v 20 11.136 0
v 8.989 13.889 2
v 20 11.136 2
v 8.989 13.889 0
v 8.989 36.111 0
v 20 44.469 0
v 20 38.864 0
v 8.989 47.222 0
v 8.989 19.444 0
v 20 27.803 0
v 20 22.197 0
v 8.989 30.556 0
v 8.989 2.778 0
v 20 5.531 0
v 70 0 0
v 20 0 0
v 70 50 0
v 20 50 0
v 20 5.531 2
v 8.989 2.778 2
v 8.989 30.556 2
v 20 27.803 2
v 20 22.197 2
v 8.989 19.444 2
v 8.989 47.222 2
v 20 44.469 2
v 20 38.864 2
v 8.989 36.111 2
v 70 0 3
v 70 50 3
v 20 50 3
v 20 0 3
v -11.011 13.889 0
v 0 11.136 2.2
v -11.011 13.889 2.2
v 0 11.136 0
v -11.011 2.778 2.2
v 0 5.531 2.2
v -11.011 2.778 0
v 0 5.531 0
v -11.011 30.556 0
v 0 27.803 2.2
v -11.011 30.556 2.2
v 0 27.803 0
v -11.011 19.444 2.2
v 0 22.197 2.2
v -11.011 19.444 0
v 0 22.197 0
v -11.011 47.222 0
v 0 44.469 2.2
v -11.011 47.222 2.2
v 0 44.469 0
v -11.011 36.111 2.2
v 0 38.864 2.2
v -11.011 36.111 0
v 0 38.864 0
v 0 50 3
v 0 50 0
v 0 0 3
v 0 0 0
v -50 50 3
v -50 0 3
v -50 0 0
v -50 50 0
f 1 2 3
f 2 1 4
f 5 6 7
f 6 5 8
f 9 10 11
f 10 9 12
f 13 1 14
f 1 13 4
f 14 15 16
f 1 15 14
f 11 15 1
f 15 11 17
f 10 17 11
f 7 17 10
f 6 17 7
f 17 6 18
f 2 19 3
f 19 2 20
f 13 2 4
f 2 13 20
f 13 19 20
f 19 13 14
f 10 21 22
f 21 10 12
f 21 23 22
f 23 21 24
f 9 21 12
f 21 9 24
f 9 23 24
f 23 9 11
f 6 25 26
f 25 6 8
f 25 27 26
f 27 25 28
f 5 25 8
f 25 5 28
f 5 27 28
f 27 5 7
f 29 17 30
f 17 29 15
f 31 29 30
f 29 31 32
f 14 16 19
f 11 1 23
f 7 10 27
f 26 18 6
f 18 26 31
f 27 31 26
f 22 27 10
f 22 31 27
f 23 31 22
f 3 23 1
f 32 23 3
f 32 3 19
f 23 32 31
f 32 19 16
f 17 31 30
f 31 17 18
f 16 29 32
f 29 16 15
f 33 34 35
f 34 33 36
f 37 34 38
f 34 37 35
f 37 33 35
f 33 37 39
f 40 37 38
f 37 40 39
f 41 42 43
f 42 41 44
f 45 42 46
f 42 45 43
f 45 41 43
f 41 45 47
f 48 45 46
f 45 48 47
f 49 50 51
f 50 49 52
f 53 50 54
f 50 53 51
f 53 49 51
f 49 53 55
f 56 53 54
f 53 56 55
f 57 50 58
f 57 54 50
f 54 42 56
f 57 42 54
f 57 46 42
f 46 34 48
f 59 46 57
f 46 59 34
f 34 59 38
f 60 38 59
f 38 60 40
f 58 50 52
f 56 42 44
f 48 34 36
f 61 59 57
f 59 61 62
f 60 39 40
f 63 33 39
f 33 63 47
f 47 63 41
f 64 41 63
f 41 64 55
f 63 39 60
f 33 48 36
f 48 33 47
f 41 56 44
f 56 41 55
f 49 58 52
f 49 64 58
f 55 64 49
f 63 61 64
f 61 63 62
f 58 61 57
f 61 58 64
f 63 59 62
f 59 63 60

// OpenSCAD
// Inline dovetail joint
E = 0.1;
SLOT_EXTRA_HEIGHT = 0.2;

MIN_TAIL = 10;

// Tail oriented to the left centered at the base
module wedge(tail, base, depth, height) {
  linear_extrude(height)
    polygon([[0, base/2], [-depth, tail/2],
             [-depth, -tail/2], [0, -base/2]]);
}

// Equally spaced tabs fill an edge of length
// edge (vertical from [0, 0, 0]) s.t. E = N(T+B)
// where T is the max width of a tab and B
// is the base (or min width) of the tab.
// Use B = T / 2, so E = N * T * 3/2
// And, T = E / N * 2/3
// We also choose depth of tab equal to T.
module tabs(count, edge, height) {
  tail = edge / count * 2/3;
  base = tail / 2;
  spacing = tail + base;
  echo(tail, base, spacing);
  for (i=[0:count-1]) {
    translate([0, i * spacing + tail/2 + base/2, 0])
      wedge(tail, base, tail, height);
  }
}

// Choose a number of tabs to fill the edge equally,
// with a max tab width is at least min_tail.
// N = floor(E/((T+B)) 
module auto_tabs(min_tail, edge, height) {
  count = floor(edge / (min_tail * 3/2));
  tabs(count, edge, height);
}

module add_tabs_left(edge, height) {
  translate([E, 0, 0])
    auto_tabs(MIN_TAIL, edge, height);
  children();
}

module add_slots_left(edge, height) {
  difference() {
    children();
    translate([E, 0, -E])
      auto_tabs(MIN_TAIL, edge, height + E + SLOT_EXTRA_HEIGHT);
  }
}

translate([20, 0, 0]) {
  add_tabs_left(50, 2)
    cube([50, 50, 3]);
}

add_slots_left(50, 2) {
  translate([-50, 0, 0])
    cube([50, 50, 3]);
}
